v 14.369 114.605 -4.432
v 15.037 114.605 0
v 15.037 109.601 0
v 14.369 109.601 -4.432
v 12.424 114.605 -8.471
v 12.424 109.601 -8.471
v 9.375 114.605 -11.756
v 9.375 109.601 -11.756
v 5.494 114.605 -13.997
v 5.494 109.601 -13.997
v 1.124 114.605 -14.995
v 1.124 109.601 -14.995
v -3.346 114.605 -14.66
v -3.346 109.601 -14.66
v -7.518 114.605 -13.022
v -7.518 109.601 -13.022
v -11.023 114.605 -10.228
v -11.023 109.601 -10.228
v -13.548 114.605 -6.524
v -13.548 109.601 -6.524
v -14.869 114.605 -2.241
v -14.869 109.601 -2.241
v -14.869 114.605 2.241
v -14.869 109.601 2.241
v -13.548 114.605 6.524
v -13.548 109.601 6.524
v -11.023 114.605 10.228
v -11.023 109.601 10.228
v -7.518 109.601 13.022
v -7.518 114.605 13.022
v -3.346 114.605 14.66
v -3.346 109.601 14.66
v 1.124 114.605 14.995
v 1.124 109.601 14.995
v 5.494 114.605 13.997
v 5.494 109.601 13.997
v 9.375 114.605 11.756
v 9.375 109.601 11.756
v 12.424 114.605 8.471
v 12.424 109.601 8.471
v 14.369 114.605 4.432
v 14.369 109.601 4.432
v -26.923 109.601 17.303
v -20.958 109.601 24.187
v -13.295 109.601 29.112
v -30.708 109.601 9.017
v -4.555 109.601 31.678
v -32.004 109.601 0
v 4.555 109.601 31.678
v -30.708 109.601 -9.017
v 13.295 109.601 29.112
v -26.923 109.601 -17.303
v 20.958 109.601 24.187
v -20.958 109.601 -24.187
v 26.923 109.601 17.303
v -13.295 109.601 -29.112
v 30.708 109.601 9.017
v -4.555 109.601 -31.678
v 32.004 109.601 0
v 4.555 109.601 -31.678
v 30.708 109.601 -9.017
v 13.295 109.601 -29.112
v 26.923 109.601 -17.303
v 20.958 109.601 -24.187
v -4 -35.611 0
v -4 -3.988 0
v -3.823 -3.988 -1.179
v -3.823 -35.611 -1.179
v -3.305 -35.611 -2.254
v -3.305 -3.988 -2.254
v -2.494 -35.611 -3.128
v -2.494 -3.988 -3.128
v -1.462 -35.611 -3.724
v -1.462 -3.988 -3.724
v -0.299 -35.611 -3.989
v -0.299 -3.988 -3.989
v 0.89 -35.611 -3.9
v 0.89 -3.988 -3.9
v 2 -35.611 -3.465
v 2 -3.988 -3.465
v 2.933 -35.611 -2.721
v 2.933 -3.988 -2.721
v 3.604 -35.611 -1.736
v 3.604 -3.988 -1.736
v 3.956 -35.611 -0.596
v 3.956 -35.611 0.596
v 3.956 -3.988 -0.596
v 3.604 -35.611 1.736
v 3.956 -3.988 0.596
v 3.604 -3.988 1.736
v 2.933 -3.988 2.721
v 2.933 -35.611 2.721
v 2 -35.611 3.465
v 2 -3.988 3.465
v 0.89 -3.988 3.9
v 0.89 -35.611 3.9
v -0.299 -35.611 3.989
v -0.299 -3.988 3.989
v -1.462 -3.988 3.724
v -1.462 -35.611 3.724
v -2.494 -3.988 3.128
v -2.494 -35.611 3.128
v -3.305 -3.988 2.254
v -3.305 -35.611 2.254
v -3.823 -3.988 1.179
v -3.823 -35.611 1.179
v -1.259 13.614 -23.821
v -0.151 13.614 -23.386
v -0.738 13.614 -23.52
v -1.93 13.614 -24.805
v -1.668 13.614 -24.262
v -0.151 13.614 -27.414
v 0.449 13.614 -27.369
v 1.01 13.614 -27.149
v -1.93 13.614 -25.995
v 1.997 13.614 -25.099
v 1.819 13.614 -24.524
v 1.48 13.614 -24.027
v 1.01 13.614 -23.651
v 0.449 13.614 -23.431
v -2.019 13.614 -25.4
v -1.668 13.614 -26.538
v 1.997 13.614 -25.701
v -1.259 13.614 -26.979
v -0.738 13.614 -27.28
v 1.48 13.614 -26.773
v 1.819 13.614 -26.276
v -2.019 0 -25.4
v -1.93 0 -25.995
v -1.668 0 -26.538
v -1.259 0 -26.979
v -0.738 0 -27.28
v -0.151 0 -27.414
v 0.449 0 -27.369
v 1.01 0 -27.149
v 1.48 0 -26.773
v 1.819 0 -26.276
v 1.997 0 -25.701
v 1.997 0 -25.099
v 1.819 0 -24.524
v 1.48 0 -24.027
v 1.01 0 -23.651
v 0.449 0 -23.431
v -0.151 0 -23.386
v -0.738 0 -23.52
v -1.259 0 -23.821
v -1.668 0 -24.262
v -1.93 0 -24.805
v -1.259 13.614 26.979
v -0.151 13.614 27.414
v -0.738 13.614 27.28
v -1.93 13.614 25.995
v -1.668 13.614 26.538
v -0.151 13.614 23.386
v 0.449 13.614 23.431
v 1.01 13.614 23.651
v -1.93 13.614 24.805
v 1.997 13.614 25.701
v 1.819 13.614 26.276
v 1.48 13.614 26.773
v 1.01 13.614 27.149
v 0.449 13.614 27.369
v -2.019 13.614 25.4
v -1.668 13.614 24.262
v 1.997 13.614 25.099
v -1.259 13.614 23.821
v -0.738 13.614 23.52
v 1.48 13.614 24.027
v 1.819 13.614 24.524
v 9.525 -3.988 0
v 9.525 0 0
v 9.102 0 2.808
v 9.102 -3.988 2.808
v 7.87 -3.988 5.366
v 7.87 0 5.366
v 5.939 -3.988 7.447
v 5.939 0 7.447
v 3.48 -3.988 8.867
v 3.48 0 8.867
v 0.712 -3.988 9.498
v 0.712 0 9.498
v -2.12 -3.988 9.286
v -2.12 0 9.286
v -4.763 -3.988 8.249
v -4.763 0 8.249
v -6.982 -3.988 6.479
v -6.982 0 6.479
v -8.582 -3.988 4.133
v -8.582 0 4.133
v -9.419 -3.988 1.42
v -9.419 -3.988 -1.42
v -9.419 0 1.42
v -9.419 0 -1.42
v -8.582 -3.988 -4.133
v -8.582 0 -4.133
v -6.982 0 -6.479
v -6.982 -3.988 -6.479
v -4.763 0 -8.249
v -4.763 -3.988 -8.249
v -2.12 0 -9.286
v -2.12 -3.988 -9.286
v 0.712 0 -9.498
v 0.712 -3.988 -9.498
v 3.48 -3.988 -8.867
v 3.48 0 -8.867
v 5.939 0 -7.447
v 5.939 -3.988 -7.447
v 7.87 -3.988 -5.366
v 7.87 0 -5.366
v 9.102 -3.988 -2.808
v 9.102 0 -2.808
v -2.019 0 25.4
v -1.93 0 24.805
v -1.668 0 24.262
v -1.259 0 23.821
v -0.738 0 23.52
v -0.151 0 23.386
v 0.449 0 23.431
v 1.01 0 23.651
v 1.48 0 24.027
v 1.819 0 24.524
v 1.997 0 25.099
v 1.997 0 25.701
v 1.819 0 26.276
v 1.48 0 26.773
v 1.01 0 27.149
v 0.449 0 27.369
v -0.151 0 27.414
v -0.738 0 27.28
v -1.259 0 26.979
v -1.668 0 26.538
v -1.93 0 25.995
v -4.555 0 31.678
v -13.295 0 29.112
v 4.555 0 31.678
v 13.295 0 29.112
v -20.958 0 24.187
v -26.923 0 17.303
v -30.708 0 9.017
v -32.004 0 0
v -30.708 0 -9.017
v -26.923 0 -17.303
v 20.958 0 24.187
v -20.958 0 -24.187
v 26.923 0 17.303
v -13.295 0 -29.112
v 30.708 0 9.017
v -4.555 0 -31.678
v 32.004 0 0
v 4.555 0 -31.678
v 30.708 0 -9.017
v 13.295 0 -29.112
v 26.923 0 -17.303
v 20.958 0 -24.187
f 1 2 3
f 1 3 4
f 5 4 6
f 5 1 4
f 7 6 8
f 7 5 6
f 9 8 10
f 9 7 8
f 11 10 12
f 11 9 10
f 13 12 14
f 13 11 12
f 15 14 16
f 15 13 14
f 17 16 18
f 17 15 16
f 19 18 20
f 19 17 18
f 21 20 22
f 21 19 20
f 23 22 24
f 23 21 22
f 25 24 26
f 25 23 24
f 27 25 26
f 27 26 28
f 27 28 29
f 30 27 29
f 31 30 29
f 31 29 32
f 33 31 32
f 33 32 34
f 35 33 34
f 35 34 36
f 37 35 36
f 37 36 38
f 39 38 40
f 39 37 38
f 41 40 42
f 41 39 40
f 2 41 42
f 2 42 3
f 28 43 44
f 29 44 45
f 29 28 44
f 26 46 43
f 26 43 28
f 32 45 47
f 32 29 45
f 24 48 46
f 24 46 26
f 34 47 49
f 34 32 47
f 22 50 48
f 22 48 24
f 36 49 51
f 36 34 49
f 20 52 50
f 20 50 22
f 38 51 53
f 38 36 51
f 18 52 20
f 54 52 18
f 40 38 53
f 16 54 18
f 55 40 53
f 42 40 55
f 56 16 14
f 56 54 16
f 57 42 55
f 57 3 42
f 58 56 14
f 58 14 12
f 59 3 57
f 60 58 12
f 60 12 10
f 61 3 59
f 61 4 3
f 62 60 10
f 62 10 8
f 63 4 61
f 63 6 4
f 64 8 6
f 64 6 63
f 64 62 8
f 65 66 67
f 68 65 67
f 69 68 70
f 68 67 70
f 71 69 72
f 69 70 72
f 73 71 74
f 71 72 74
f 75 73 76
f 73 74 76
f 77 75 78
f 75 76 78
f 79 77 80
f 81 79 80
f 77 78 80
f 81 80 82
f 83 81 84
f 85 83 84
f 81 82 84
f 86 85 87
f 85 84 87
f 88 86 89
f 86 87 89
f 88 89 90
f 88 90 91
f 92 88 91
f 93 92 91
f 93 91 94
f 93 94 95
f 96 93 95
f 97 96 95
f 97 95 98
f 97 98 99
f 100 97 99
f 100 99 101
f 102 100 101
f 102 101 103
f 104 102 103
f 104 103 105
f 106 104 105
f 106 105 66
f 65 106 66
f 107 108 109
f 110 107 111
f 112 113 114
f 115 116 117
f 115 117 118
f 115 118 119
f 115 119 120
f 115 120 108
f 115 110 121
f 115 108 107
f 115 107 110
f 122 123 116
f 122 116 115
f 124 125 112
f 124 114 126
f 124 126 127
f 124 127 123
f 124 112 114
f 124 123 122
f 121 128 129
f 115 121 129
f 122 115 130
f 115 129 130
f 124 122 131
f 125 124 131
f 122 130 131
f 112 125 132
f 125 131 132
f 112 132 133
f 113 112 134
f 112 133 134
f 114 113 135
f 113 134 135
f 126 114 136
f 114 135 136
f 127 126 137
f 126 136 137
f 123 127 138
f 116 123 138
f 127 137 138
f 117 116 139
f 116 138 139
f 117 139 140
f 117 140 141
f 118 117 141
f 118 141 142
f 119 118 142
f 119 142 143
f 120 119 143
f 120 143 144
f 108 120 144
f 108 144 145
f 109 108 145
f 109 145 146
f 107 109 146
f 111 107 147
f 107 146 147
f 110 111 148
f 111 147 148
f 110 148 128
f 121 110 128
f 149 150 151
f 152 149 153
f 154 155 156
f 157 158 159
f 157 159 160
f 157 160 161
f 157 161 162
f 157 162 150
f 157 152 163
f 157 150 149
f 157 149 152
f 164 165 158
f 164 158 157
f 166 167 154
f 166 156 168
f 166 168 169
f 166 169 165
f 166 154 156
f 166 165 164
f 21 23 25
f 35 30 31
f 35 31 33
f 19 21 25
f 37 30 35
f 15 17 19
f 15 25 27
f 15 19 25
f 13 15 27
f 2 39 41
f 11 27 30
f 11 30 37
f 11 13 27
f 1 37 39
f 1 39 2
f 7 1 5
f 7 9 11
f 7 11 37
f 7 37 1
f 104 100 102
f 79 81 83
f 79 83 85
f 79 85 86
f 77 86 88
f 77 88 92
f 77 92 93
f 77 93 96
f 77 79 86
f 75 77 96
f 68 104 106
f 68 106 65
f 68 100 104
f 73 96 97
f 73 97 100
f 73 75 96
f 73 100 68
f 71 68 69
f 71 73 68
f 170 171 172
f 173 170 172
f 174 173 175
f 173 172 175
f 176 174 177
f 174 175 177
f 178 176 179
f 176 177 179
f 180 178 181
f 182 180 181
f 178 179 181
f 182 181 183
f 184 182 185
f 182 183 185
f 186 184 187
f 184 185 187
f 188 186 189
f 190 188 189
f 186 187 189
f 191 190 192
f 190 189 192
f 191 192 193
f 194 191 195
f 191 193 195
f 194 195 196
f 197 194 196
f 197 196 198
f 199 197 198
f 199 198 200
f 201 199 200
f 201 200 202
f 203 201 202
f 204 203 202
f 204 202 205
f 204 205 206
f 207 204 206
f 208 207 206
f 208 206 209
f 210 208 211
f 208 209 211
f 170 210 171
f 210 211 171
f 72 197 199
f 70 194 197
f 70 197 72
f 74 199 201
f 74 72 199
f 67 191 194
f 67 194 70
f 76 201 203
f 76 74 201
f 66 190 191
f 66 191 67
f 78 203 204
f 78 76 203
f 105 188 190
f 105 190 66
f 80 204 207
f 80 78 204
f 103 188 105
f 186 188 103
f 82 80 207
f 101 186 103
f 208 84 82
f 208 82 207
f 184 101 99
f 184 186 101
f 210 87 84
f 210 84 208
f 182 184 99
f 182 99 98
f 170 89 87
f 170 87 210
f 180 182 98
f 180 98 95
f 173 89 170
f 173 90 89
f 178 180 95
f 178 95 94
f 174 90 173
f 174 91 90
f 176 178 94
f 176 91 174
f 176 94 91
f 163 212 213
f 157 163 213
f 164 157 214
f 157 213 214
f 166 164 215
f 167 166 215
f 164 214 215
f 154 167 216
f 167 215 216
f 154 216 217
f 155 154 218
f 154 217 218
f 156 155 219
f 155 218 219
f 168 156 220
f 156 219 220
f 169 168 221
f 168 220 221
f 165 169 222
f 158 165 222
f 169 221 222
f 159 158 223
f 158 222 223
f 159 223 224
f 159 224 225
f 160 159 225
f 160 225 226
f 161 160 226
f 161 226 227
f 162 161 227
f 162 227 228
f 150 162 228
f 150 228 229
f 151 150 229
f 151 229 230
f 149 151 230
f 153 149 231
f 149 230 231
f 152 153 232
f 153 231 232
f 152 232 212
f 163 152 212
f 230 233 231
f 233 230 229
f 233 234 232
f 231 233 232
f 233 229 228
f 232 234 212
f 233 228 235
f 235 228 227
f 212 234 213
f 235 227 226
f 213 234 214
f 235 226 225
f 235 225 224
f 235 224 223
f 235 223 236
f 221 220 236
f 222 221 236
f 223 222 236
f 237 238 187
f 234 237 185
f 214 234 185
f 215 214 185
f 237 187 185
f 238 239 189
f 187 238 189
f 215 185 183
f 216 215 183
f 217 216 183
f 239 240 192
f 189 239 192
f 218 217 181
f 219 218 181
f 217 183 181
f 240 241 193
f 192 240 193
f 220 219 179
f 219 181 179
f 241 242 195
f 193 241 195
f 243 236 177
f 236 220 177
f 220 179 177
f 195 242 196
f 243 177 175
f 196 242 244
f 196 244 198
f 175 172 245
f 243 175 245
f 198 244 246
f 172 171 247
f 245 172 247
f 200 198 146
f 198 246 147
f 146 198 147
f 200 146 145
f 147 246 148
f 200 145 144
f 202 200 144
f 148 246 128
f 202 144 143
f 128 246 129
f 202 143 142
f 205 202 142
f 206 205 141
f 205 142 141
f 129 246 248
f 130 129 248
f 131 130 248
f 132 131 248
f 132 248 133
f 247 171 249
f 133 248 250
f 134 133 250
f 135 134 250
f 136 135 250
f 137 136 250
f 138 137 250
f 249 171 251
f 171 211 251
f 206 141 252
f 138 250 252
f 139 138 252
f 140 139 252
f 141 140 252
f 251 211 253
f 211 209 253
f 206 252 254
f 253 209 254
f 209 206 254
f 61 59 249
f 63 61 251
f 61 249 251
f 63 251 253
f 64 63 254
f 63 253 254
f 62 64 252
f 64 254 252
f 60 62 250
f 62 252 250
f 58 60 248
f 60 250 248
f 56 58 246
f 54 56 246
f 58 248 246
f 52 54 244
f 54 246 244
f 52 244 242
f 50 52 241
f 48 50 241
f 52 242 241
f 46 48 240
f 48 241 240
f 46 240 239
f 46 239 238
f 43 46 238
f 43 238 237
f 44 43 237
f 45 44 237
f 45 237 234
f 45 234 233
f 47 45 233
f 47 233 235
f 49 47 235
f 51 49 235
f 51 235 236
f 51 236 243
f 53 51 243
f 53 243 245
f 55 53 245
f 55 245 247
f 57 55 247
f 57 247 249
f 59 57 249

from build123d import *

# Parameters (mm, degrees)
SKETCH1_R           = 32.004
BOSS_EXTRUDE1_DEPTH = 114.6048
SKETCH2_R           = 32.004
SKETCH2_R_2         = 15.0368
CUT_EXTRUDE1_DEPTH  = 5.0038
SKETCH3_R           = 2.0193
CUT_EXTRUDE2_DEPTH  = 13.6144
SKETCH4_R           = 9.525
BOSS_EXTRUDE2_DEPTH = 3.9878
SKETCH6_R           = 4.0005
BOSS_EXTRUDE3_DEPTH = 35.6108


with BuildPart() as part:
    # Sketch1 → Boss-Extrude1 (new body)
    with BuildSketch(Plane(origin=(0, 0, 0), x_dir=(1, 0, 0), z_dir=(0, 1, 0))):
        Circle(SKETCH1_R)
    extrude(amount=BOSS_EXTRUDE1_DEPTH)

    # Sketch2 → Cut-Extrude1 (cut)
    with BuildSketch(Plane(origin=(0, 114.6048, 0), x_dir=(1, 0, 0), z_dir=(0, 1, 0))):
        Circle(SKETCH2_R)
        Circle(SKETCH2_R_2, mode=Mode.SUBTRACT)
    extrude(amount=-CUT_EXTRUDE1_DEPTH, mode=Mode.SUBTRACT)

    # Sketch3 → Cut-Extrude2 (cut)
    with BuildSketch(Plane(origin=(0, 0, 0), x_dir=(-1, 0, 0), z_dir=(0, -1, 0))):
        with Locations((0, -25.4)):
            Circle(SKETCH3_R)
        with Locations((0, 25.4)):
            Circle(SKETCH3_R)
    extrude(amount=-CUT_EXTRUDE2_DEPTH, mode=Mode.SUBTRACT)

    # Sketch4 → Boss-Extrude2 (add)
    with BuildSketch(Plane.XZ):
        Circle(SKETCH4_R)
    extrude(amount=BOSS_EXTRUDE2_DEPTH)

    # Sketch6 → Boss-Extrude3 (add)
    with BuildSketch(Plane(origin=(0, 0, 0), x_dir=(-1, 0, 0), z_dir=(0, -1, 0))):
        Circle(SKETCH6_R)
    extrude(amount=BOSS_EXTRUDE3_DEPTH)


solid = part.part
